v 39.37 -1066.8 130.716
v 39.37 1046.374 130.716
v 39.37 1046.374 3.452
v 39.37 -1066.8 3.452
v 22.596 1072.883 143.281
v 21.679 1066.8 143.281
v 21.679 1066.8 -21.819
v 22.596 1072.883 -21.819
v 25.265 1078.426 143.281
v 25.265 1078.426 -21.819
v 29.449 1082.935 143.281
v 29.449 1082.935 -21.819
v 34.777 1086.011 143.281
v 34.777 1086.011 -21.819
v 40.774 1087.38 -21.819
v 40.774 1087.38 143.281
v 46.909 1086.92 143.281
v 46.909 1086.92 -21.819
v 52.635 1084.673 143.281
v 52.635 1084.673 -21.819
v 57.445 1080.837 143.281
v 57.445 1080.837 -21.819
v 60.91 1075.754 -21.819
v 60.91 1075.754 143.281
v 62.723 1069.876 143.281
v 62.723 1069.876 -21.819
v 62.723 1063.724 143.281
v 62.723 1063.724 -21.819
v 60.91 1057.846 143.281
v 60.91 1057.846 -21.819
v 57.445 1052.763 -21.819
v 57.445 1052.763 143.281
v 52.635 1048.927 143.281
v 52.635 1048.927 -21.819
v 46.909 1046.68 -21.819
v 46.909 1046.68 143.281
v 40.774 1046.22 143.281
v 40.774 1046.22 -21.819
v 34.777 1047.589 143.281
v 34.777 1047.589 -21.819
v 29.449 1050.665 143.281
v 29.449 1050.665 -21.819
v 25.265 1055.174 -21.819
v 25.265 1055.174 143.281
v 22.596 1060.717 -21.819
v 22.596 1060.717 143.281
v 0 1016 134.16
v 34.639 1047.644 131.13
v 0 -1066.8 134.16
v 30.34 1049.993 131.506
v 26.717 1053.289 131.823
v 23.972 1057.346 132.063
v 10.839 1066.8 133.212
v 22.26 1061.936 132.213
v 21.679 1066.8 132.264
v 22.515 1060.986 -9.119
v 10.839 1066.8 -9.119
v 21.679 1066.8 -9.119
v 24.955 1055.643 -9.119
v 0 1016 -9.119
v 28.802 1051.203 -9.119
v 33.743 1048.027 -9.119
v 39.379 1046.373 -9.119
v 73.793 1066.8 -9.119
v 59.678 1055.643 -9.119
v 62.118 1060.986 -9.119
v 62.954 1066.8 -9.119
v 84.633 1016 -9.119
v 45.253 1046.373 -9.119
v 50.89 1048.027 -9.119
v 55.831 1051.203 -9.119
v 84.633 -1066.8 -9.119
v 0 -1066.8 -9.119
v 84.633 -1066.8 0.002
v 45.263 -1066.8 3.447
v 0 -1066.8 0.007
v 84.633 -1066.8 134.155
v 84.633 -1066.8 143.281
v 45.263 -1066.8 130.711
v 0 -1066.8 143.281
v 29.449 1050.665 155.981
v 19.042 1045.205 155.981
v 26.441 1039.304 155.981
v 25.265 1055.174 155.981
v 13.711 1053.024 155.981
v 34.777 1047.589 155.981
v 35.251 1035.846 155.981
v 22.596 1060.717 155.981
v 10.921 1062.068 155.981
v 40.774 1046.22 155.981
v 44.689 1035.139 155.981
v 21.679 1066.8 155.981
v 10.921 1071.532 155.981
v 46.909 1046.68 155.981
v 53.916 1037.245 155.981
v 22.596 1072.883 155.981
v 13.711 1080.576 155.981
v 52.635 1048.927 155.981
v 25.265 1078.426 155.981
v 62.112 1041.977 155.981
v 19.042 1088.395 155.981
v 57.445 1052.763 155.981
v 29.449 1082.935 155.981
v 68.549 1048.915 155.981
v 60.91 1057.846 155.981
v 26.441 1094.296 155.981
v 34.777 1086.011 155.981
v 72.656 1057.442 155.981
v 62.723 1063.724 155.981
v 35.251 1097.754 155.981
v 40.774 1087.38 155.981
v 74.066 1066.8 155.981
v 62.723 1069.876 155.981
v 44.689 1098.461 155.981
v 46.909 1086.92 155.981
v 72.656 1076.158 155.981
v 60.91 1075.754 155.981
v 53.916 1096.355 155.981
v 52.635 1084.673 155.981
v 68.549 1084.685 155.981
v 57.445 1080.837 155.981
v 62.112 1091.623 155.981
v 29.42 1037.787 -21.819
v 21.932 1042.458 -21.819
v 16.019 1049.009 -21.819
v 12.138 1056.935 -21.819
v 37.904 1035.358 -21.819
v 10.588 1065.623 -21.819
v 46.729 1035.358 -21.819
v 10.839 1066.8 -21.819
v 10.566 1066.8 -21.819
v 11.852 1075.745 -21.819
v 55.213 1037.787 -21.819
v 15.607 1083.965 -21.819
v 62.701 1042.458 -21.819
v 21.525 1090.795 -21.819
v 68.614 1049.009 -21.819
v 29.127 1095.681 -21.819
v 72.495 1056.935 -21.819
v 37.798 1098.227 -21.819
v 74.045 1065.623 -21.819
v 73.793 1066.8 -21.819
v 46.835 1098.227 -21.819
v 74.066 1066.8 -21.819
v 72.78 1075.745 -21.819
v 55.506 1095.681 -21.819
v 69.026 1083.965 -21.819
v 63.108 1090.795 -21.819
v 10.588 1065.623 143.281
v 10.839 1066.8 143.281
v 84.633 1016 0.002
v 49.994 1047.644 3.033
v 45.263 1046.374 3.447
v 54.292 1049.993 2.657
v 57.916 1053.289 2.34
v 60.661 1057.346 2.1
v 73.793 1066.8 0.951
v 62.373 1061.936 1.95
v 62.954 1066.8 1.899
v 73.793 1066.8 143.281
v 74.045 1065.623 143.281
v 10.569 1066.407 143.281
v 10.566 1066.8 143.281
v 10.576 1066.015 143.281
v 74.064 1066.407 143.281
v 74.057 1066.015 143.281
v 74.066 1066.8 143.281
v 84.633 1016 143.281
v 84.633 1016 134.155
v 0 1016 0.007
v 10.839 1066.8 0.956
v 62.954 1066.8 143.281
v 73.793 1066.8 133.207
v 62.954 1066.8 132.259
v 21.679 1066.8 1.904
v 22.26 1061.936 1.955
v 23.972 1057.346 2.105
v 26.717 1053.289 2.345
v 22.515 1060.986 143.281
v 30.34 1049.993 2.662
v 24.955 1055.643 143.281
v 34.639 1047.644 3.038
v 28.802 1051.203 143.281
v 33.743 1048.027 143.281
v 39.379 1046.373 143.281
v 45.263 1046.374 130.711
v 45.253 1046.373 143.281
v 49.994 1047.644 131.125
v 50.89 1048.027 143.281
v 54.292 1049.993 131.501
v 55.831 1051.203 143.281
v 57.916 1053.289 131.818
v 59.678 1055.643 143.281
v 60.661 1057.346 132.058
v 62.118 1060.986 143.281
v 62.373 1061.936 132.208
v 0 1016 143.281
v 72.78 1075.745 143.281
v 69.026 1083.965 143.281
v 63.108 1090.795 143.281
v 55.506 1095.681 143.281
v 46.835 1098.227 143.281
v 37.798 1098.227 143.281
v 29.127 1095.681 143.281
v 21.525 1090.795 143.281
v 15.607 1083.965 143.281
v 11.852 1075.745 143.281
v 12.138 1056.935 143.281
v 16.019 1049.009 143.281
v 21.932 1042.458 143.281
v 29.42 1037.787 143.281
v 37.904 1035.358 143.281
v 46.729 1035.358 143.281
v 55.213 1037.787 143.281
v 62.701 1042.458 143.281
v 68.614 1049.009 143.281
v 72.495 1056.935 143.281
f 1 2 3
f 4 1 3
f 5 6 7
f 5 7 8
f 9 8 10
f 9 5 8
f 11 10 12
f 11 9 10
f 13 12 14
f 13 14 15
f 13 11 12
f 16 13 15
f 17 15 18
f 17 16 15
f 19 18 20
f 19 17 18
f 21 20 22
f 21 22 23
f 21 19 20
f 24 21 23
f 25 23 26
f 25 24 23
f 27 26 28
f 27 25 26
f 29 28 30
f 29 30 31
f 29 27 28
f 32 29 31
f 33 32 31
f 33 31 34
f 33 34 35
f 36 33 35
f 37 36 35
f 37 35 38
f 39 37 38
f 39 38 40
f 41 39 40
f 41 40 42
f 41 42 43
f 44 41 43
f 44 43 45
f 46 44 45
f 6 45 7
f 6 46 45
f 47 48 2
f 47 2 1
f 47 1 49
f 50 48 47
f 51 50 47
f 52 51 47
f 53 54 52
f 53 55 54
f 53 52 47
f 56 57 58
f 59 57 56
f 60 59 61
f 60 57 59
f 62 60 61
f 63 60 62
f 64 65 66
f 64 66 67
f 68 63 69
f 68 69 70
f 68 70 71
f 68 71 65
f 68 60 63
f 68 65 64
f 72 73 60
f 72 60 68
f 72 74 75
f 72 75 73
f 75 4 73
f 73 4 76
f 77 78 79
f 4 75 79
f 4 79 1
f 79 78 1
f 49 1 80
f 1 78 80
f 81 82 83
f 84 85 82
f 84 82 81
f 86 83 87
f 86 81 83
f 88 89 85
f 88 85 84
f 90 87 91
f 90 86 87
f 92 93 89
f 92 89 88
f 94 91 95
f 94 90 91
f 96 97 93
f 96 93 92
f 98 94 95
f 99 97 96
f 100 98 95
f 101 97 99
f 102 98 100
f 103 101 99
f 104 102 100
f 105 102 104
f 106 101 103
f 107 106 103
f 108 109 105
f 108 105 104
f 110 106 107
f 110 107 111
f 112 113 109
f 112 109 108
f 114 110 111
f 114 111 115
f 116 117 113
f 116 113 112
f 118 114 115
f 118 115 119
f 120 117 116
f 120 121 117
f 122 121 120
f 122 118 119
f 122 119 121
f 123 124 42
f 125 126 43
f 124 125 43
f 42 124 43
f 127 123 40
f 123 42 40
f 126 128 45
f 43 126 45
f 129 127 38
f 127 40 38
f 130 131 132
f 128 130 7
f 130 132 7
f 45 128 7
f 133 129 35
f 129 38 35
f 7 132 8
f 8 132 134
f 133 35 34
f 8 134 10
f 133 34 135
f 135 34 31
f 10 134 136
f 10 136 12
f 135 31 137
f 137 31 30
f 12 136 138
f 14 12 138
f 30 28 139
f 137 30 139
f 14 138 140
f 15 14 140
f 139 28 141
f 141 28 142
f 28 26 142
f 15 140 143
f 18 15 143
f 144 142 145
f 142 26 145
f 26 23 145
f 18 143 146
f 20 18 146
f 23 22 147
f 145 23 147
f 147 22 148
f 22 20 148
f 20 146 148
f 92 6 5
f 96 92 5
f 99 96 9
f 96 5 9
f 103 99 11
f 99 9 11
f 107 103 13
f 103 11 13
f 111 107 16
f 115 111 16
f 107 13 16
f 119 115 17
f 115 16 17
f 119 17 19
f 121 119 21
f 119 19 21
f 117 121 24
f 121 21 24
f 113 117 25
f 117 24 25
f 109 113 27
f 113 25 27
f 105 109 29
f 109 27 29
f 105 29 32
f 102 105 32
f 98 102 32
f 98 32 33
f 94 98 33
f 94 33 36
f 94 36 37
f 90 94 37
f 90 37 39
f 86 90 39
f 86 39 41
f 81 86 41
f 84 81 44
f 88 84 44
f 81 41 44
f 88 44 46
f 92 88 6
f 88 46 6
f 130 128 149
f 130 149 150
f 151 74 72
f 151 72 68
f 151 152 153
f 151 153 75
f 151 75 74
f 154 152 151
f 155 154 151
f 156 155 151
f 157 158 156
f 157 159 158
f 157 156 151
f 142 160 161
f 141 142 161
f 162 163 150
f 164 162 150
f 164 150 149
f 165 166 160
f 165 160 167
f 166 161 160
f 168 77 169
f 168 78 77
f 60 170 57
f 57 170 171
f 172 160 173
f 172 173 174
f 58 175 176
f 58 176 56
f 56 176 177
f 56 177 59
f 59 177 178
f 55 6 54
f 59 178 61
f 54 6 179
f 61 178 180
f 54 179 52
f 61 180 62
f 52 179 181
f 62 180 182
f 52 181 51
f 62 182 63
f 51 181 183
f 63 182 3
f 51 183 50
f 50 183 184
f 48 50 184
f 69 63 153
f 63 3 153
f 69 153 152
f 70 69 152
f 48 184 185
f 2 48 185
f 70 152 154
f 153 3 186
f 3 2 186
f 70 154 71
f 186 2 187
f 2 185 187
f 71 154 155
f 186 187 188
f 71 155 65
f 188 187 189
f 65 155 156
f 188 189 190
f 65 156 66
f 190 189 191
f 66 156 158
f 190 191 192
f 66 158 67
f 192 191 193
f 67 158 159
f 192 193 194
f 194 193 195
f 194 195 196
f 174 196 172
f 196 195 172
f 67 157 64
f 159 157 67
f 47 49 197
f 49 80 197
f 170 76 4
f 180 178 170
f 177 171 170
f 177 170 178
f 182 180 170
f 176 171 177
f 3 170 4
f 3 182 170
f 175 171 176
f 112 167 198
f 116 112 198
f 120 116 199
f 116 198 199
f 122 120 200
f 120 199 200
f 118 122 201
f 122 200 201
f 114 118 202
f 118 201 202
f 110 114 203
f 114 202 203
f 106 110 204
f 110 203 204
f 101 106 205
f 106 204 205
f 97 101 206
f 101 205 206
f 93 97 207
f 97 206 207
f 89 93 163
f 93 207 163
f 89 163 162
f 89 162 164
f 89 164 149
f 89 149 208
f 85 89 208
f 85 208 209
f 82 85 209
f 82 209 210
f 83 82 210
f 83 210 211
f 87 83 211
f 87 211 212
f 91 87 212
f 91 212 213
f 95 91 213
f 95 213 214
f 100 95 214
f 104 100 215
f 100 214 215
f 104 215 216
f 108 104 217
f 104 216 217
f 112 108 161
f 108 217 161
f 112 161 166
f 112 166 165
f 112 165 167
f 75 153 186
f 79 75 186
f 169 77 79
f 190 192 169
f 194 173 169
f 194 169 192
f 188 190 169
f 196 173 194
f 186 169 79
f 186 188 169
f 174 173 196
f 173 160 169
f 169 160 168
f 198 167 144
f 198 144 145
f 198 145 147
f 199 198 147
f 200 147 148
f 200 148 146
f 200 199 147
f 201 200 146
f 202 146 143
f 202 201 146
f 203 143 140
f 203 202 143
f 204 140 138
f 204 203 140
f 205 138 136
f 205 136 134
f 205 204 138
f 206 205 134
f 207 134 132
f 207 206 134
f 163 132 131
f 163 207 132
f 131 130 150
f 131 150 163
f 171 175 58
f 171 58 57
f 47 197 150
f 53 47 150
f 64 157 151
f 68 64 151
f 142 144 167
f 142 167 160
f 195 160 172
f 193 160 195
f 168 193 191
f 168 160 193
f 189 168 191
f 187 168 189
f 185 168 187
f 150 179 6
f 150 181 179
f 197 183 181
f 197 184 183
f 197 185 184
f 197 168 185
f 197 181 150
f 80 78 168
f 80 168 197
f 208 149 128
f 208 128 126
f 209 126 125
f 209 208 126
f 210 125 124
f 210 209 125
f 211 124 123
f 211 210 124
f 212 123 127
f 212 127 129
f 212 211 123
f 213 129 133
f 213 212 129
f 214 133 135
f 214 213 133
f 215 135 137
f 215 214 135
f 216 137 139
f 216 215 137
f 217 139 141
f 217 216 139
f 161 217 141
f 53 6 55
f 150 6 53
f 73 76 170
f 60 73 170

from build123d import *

# Parameters (mm, degrees)
F1_DEPTH      = 1066.8
F2_T4_DEPTH   = 2133.6
F2_T9_DEPTH   = 2133.6
F3_T4_DEPTH   = 2133.6
F3_T9_DEPTH   = 2133.6
F5_DEPTH      = 165.1
F5_DEPTH_BACK = 12.7
F6_R          = 20.6375
F7_DEPTH      = 165.101
F9_DEPTH      = 165.101


# Not quite as in the source:
# - a fillet or chamfer that OpenCascade refuses, or shapes differently, is made with other operations: its cross-section is extruded or revolved along the edge and cut away or added


with BuildPart() as f1:
    # F0 (on Front) → F1 (new body, symmetric)
    with BuildSketch(Plane.XZ):
        Polygon((39.37, 143.2814), (0, 143.2814), (0, 134.1628), (39.37, 134.1628), (39.37, 0), (0, 0), (0, -9.1186), (84.6328, -9.1186), (84.6328, 0), (45.2628, 0), (45.2628, 134.1628), (84.6328, 134.1628), (84.6328, 143.2814), (45.2628, 143.2814), align=None)
    extrude(amount=F1_DEPTH, both=True)

    # F2: chamfer of 3.44678 x 39.3968756761 on 2 edges, made by hand


with BuildPart() as f2_tool2:
    # F2_s3 → F2_t4 (new body)
    with BuildSketch(Plane.XZ.offset(-1066.8)):
        Polygon((39.37, 130.71602), (-0.0268756761, 134.1628), (39.37, 134.1628), align=None)
    extrude(amount=F2_T4_DEPTH)

    split(bisect_by=Plane.YZ, keep=Keep.TOP)


with BuildPart() as f1_1:
    add(f1.part)

    # F2_t1: union F2_tool2
    add(f2_tool2.part)


with BuildPart() as f2_tool7:
    # F2_s8 → F2_t9 (new body)
    with BuildSketch(Plane.XZ.offset(-1066.8)):
        Polygon((45.2628, 3.44678), (84.6596756761, 0), (45.2628, 0), align=None)
    extrude(amount=F2_T9_DEPTH)

    split(bisect_by=Plane.YZ.offset(84.6328), keep=Keep.BOTTOM)


with BuildPart() as f1_2:
    add(f1_1.part)

    # F2_t6: union F2_tool7
    add(f2_tool7.part)

    # F3: chamfer of 3.45186 x 39.4549403418 on 2 edges, made by hand


with BuildPart() as f3_tool2:
    # F3_s3 → F3_t4 (new body)
    with BuildSketch(Plane.XZ.offset(-1066.8)):
        Polygon((-0.0849403418, 0), (39.37, 3.45186), (39.37, 0), align=None)
    extrude(amount=F3_T4_DEPTH)

    split(bisect_by=Plane.YZ, keep=Keep.TOP)


with BuildPart() as f1_3:
    add(f1_2.part)

    # F3_t1: union F3_tool2
    add(f3_tool2.part)


with BuildPart() as f3_tool7:
    # F3_s8 → F3_t9 (new body)
    with BuildSketch(Plane.XZ.offset(-1066.8)):
        Polygon((84.7177403418, 134.1628), (45.2628, 130.71094), (45.2628, 134.1628), align=None)
    extrude(amount=F3_T9_DEPTH)

    split(bisect_by=Plane.YZ.offset(84.6328), keep=Keep.BOTTOM)


with BuildPart() as f1_4:
    add(f1_3.part)

    # F3_t6: union F3_tool7
    add(f3_tool7.part)

    # F6 (on face) → F7 (cut, through all)
    with BuildSketch(Plane.XY.offset(143.2814)):
        with Locations((42.3164, 1066.8)):
            Circle(F6_R)
    extrude(amount=-F7_DEPTH, mode=Mode.SUBTRACT)


with BuildPart() as f5:
    # F4 (on face) → F5 (new body, two sides)
    with BuildSketch(Plane.XY.offset(143.2814)) as f5_sk:
        with BuildLine():
            ThreePointArc((10.5664, 1066.8), (42.3164, 1035.05), (74.0664, 1066.8))
            Line((74.0664, 1066.8), (62.9539, 1066.8))
            ThreePointArc((62.9539, 1066.8), (42.3164, 1046.1625), (21.6789, 1066.8))
            Line((21.6789, 1066.8), (10.5664, 1066.8))
        make_face()
        with BuildLine():
            Line((62.9539, 1066.8), (74.0664, 1066.8))
            ThreePointArc((74.0664, 1066.8), (42.3164, 1098.55), (10.5664, 1066.8))
            Line((10.5664, 1066.8), (21.6789, 1066.8))
            ThreePointArc((21.6789, 1066.8), (42.3164, 1087.4375), (62.9539, 1066.8))
        make_face()
    extrude(amount=-F5_DEPTH)
    extrude(f5_sk.sketch, amount=F5_DEPTH_BACK)


with BuildPart() as f9_tool:
    # F8 (on face) → F9 (new body, through all)
    with BuildSketch(Plane.XY.offset(143.2814)):
        Polygon((0, 1016), (10.83945, 1066.8), (0, 1066.8), align=None)
        Polygon((84.6328, 1016), (84.6328, 1066.8), (73.79335, 1066.8), align=None)
    extrude(amount=-F9_DEPTH)


with BuildPart() as f1_5:
    add(f1_4.part)

    # F9: cut by f9_tool
    add(f9_tool.part, mode=Mode.SUBTRACT)


with BuildPart() as f5_1:
    add(f5.part)

    # F9: cut by f9_tool
    add(f9_tool.part, mode=Mode.SUBTRACT)


solid = Compound([f1_5.part, f5_1.part])
